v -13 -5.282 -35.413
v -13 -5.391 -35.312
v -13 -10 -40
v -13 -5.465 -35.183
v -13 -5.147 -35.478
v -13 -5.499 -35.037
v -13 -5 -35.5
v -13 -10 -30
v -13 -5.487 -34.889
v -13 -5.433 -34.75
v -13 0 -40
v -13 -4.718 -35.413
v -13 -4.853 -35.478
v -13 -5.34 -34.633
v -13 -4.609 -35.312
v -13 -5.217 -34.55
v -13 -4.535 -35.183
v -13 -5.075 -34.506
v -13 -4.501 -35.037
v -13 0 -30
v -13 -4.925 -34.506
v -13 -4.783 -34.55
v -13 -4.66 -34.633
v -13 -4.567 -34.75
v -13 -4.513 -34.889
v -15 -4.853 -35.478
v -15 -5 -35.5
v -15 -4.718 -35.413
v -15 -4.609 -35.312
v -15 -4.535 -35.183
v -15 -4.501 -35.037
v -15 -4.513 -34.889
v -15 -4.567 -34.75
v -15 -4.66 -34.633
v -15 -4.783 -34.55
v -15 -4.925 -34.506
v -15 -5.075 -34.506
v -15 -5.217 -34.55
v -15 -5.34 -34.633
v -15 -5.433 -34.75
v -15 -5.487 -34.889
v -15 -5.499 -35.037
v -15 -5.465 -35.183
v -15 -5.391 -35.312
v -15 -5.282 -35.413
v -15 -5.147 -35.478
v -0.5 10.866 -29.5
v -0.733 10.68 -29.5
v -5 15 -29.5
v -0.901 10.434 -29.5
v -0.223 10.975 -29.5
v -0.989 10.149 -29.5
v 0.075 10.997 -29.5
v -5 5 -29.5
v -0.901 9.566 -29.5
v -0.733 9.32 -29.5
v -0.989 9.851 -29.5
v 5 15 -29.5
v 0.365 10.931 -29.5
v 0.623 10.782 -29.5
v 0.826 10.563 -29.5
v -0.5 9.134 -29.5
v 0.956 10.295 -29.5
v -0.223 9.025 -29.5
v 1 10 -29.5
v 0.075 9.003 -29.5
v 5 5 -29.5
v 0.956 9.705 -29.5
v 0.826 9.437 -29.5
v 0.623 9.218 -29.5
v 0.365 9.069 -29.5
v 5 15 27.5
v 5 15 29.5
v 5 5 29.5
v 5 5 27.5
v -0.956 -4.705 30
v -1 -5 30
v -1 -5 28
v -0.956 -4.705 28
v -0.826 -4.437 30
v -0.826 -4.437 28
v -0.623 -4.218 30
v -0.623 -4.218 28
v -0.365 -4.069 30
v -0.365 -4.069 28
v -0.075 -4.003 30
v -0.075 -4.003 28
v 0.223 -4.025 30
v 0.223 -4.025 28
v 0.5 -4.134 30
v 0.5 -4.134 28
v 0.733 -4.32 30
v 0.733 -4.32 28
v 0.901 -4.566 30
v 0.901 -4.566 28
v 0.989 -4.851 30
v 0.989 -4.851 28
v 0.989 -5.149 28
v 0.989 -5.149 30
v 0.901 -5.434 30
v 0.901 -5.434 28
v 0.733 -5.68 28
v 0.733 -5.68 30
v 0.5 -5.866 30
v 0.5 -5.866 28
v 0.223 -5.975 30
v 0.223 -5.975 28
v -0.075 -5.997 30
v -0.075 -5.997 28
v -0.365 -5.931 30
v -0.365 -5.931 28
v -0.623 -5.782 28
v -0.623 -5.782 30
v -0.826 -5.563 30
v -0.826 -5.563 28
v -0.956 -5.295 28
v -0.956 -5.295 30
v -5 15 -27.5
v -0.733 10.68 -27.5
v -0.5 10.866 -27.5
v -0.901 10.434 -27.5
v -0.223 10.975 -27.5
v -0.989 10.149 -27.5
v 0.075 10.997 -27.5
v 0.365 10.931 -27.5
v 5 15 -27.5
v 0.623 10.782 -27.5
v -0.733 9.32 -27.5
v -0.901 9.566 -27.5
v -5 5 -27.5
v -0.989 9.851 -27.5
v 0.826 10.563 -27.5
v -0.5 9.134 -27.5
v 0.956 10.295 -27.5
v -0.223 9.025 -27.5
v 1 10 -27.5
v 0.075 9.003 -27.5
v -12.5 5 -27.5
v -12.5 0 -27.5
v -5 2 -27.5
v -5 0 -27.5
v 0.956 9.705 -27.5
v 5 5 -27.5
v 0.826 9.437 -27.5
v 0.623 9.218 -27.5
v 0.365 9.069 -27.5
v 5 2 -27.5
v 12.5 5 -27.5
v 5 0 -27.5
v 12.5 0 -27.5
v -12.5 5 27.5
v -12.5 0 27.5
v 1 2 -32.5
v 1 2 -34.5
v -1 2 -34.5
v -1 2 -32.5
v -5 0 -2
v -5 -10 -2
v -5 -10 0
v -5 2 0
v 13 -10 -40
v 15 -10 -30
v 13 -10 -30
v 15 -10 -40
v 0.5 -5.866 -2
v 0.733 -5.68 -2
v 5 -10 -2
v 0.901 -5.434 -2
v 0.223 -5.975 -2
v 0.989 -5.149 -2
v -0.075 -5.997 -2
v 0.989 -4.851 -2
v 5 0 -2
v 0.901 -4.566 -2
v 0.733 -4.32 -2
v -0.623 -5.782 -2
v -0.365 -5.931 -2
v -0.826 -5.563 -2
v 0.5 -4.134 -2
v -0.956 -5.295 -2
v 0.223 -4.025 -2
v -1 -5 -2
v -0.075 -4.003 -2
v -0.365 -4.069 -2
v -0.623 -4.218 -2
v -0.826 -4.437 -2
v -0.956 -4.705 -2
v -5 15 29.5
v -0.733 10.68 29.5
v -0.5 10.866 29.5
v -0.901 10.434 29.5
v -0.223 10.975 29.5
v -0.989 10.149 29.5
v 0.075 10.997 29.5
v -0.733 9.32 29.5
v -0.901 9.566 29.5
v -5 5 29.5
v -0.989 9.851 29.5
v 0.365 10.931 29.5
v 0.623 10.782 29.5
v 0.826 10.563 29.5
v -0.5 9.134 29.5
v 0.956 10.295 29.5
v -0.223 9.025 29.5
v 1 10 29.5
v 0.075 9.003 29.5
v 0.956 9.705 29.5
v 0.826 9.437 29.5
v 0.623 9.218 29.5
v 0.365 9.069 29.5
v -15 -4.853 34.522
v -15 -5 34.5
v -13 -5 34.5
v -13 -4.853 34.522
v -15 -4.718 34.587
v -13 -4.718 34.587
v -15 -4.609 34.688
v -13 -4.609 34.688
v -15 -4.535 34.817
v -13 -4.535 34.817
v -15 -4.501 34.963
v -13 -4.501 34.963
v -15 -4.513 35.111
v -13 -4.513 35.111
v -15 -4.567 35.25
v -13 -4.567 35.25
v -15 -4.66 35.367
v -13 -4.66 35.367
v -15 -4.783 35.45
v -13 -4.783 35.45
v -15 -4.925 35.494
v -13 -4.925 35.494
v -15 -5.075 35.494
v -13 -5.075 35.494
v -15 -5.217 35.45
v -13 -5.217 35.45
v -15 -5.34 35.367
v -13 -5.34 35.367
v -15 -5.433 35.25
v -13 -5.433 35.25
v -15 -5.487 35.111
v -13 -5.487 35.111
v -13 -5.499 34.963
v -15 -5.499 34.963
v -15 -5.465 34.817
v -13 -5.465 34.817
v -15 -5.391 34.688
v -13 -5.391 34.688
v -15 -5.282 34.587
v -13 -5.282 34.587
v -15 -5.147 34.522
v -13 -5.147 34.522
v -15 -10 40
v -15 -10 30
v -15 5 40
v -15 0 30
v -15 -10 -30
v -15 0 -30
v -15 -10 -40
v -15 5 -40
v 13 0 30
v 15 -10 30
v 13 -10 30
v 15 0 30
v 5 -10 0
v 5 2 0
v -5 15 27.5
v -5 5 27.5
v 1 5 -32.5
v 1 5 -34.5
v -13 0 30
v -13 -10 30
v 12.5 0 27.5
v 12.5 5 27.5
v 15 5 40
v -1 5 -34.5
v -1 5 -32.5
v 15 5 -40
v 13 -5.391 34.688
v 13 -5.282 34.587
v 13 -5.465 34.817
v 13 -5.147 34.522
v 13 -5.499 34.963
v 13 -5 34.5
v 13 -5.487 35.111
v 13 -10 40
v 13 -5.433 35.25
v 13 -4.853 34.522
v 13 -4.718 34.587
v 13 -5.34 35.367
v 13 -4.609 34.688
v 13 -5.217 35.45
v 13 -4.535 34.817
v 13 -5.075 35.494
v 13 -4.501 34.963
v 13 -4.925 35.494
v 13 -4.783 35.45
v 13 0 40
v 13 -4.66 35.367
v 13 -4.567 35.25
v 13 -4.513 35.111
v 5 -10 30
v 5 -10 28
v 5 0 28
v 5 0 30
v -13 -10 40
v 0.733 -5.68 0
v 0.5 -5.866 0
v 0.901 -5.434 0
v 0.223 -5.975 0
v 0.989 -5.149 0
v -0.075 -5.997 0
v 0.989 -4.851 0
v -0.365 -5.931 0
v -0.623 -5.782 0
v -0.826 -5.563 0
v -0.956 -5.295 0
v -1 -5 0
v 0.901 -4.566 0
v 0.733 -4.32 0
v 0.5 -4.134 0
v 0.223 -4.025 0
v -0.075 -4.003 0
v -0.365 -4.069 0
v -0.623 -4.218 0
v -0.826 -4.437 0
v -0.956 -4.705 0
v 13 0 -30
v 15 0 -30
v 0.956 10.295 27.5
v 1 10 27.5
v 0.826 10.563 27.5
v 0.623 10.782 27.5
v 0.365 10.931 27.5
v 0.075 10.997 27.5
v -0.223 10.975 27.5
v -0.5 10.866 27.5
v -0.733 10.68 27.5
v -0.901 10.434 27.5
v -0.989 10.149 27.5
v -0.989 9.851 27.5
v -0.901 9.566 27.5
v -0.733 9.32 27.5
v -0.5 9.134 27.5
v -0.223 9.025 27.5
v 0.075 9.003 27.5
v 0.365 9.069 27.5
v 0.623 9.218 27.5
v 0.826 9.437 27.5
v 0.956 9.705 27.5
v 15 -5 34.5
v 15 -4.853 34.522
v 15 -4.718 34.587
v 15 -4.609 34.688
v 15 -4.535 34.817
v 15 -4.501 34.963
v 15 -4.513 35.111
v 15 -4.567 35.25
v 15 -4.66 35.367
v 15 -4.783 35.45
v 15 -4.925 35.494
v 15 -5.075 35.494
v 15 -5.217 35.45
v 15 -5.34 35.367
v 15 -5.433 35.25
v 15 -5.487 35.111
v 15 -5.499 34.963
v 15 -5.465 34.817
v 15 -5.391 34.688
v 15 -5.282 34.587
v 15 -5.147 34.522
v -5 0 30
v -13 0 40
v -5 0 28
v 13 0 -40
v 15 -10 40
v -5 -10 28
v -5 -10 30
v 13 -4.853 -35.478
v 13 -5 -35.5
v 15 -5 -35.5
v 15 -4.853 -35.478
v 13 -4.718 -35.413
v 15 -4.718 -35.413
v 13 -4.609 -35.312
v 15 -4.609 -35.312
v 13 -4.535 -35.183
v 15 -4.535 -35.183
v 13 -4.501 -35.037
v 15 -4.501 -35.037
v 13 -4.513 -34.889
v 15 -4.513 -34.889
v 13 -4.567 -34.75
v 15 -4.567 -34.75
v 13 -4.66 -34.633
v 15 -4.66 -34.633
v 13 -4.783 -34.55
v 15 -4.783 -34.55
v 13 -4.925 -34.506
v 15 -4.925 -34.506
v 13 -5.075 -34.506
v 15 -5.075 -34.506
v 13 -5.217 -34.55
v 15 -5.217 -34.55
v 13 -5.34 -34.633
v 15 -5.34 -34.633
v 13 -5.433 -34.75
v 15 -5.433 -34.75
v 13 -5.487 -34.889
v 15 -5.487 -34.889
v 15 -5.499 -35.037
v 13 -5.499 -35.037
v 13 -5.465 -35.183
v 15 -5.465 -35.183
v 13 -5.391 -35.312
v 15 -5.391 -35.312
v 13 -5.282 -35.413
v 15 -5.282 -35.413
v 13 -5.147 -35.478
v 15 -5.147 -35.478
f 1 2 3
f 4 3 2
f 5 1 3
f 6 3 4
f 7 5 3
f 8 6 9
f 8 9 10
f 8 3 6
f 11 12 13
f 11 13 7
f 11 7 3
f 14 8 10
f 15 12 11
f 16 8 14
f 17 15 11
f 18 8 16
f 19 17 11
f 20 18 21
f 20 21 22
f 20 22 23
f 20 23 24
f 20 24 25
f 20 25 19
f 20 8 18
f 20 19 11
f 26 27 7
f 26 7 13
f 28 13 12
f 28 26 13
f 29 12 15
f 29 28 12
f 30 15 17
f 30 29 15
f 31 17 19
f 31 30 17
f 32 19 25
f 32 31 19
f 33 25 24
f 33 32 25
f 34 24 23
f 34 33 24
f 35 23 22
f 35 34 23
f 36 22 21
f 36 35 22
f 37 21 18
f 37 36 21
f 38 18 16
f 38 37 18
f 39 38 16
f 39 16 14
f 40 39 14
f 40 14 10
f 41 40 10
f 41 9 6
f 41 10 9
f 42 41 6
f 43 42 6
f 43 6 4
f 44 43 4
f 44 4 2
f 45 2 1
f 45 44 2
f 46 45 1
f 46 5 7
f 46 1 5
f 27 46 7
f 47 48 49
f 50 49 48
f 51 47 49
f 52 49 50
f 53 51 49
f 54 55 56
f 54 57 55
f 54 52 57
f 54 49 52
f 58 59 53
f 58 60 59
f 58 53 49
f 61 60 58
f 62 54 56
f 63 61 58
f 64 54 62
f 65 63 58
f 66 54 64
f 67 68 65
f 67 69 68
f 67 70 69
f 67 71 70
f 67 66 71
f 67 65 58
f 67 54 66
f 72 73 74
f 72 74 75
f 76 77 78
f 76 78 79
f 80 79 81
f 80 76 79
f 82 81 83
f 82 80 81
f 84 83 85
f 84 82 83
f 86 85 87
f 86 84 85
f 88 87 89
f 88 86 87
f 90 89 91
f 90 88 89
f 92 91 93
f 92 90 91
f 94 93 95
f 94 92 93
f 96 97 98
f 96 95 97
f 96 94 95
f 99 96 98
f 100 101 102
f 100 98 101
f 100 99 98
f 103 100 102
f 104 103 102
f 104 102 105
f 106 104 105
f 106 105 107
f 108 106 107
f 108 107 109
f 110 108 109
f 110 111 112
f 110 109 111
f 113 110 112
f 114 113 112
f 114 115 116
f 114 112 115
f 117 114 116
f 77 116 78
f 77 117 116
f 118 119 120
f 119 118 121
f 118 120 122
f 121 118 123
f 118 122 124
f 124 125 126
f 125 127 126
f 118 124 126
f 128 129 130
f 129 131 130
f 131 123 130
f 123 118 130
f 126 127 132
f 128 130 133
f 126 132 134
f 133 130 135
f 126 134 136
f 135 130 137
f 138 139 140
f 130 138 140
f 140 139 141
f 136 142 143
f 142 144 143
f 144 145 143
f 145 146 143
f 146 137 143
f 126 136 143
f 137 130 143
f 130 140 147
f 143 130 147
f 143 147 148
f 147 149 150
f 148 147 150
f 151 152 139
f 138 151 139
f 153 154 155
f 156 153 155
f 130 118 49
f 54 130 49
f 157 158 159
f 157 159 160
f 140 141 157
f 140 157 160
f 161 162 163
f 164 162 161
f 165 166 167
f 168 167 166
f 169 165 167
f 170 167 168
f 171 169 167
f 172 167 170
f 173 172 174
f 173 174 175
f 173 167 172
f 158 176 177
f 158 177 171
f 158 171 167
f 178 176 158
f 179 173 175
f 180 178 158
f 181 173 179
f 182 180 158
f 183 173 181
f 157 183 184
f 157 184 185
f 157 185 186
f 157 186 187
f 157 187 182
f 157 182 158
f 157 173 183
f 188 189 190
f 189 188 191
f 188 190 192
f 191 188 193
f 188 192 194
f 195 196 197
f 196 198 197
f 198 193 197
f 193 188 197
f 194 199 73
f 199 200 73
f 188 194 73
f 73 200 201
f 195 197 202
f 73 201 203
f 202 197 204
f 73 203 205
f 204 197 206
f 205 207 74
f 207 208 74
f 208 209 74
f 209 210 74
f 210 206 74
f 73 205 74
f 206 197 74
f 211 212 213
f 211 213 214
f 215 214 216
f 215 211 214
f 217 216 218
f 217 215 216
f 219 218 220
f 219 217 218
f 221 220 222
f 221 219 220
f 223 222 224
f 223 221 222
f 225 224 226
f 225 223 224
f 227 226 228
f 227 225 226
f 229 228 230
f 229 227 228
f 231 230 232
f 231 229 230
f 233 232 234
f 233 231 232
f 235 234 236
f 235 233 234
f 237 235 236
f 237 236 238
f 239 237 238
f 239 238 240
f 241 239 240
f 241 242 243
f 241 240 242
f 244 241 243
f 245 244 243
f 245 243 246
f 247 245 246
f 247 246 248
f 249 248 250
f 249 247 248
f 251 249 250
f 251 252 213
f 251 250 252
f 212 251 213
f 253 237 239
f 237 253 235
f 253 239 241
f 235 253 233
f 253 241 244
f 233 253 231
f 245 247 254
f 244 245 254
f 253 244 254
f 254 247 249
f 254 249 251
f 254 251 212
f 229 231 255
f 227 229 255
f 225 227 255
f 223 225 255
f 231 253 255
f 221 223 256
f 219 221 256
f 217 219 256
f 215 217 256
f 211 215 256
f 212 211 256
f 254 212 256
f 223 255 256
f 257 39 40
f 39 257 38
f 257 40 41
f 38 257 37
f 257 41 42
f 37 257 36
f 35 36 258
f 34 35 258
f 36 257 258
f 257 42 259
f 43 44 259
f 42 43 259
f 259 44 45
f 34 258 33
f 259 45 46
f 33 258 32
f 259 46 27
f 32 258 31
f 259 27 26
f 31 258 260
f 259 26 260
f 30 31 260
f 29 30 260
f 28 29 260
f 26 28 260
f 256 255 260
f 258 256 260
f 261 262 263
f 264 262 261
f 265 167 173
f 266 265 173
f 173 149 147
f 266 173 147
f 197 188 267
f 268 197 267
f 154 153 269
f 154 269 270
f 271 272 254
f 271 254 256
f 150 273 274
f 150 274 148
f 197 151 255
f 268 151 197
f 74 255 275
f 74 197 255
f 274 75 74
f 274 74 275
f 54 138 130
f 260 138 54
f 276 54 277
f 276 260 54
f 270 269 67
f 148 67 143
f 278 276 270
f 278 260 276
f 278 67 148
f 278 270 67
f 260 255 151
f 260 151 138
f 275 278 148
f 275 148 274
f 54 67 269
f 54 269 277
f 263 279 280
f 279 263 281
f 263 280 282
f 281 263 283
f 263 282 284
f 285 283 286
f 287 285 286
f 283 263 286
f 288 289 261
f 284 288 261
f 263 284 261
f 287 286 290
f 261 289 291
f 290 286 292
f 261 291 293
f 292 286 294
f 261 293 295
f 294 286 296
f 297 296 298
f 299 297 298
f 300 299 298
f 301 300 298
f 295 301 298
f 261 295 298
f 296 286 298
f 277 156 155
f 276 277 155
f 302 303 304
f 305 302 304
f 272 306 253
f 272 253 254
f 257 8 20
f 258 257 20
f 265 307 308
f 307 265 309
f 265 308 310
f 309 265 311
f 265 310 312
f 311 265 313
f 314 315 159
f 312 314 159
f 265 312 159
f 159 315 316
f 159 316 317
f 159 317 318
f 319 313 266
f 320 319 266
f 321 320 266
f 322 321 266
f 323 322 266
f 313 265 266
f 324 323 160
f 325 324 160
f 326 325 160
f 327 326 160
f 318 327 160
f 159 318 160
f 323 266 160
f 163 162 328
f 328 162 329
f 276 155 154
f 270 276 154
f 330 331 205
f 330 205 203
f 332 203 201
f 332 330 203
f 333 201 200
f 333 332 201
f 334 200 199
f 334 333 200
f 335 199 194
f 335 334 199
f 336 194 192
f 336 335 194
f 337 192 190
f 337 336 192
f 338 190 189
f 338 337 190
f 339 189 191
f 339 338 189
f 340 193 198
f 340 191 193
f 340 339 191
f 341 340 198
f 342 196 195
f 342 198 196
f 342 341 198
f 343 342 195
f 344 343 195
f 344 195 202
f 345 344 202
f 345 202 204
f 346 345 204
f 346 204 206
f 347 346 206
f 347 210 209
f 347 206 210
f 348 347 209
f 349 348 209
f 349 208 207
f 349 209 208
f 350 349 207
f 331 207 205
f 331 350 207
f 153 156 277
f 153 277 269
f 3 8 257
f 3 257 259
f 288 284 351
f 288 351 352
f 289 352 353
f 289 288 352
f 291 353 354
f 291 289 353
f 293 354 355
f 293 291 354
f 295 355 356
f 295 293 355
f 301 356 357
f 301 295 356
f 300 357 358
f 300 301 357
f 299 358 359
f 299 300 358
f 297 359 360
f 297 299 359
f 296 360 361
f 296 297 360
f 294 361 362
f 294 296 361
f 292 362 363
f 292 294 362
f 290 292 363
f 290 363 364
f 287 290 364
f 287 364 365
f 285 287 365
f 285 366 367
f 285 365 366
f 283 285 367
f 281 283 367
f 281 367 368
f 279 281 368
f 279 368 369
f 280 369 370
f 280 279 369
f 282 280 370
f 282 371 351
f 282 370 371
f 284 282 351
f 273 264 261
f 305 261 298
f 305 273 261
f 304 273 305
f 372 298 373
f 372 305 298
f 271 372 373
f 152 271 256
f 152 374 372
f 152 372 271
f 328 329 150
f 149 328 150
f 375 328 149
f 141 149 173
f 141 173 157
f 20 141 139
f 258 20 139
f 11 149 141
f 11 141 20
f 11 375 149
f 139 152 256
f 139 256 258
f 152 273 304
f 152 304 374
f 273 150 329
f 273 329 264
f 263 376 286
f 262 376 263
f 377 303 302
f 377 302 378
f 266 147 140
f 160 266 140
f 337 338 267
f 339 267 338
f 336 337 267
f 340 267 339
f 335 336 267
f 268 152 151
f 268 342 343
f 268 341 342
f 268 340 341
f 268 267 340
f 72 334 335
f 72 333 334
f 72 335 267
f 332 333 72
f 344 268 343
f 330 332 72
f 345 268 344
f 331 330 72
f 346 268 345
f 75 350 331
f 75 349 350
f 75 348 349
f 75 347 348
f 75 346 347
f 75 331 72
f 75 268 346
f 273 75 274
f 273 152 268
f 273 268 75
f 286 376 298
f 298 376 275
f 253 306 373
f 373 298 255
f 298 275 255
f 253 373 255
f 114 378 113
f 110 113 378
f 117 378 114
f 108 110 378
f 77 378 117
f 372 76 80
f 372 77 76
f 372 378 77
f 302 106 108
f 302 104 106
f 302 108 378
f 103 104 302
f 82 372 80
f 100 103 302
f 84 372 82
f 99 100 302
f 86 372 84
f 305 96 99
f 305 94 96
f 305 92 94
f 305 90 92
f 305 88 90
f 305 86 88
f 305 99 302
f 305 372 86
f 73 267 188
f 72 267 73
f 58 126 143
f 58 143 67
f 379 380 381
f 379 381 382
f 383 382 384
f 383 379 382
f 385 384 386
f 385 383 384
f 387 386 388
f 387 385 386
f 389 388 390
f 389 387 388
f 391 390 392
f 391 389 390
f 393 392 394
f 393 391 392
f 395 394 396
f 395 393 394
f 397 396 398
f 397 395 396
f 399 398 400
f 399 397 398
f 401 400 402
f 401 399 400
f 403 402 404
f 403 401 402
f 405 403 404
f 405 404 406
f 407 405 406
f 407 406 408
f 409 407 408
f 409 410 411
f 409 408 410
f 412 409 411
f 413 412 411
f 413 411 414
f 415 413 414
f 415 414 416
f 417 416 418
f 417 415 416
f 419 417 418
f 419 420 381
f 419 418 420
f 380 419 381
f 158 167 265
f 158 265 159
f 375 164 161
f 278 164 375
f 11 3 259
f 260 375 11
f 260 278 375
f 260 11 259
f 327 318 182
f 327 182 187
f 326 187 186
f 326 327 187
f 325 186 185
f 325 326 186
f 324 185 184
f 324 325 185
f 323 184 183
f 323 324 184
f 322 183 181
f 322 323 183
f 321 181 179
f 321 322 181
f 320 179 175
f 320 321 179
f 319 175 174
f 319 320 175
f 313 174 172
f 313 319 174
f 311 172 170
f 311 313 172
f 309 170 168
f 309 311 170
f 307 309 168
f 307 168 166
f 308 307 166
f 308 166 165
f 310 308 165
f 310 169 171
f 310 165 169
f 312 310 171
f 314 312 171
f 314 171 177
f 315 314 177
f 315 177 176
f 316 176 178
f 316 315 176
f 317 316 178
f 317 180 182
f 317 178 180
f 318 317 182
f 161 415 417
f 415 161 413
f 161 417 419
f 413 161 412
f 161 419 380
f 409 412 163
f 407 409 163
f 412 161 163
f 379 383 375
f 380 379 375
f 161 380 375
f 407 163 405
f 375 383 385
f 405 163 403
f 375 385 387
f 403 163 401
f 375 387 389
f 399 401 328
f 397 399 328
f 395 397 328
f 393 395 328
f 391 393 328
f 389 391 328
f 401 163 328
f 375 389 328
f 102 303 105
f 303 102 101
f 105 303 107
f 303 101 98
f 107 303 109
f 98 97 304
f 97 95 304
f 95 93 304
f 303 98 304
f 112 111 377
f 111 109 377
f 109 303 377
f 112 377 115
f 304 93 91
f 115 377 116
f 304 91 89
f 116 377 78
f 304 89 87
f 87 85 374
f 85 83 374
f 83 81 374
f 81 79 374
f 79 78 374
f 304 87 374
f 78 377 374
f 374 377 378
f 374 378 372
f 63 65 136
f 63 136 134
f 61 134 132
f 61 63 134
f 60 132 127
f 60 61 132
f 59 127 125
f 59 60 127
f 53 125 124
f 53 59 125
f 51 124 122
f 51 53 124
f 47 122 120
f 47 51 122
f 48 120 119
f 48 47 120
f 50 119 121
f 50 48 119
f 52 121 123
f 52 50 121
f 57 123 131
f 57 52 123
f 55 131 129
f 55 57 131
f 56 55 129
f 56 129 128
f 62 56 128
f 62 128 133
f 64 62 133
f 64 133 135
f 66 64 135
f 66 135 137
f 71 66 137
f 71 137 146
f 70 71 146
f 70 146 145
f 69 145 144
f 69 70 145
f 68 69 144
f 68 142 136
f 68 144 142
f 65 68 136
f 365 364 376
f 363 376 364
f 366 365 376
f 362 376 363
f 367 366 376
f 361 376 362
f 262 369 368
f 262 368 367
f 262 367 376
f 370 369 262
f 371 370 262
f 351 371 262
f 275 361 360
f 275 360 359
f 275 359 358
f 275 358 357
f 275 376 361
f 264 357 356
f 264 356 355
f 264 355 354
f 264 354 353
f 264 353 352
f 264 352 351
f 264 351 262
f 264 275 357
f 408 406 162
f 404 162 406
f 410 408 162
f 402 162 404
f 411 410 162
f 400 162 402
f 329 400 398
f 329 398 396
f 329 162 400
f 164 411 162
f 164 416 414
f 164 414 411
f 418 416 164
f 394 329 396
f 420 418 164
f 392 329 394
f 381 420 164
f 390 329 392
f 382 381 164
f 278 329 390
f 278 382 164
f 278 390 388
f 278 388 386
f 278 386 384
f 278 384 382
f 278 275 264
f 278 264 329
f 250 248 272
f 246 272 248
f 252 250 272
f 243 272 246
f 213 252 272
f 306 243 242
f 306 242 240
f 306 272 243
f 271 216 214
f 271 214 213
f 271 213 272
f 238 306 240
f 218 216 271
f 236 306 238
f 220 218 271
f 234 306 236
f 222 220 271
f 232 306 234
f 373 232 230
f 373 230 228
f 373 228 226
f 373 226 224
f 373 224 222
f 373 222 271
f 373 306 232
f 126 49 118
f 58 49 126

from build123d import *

# Parameters (mm, degrees)
SKETCH1_W                = 30
SKETCH1_H                = 80
BOSS_EXTRUDE1_DEPTH      = 5
SKETCH2_W                = 10
SKETCH2_H                = 10
BOSS_EXTRUDE2_DEPTH      = 30
CUT_EXTRUDE1_DEPTH       = 51.990195136
CUT_EXTRUDE1_DEPTH_BACK  = 51.990195136
SKETCH3_R                = 0.5
CUT_EXTRUDE2_DEPTH       = 46.276925691
CUT_EXTRUDE2_DEPTH_BACK  = 46.276925691
SKETCH4_W                = 25
SKETCH4_H                = 55
CUT_EXTRUDE3_DEPTH       = 83.006097334
CUT_EXTRUDE3_DEPTH_BACK  = 83.006097334
SKETCH5_W                = 26
SKETCH5_H                = 10
SKETCH6_W                = 10
SKETCH6_H                = 10
BOSS_EXTRUDE3_DEPTH      = 80
CUT_EXTRUDE4_DEPTH       = 83.006097334
CUT_EXTRUDE4_DEPTH_BACK  = 83.006097334
SKETCH7_R                = 1
CUT_EXTRUDE5_DEPTH       = 46.82575695
CUT_EXTRUDE5_DEPTH_BACK  = 46.82575695
SKETCH8_W                = 56
SKETCH8_H                = 10
SKETCH9_W                = 10
SKETCH9_H                = 10
CUT_EXTRUDE6_DEPTH       = 10
SKETCH10_W               = 10
SKETCH10_H               = 10
CUT_EXTRUDE7_DEPTH       = 10
SKETCH12_W               = 10
SKETCH12_H               = 2
BOSS_EXTRUDE5_DEPTH      = 10
CUT_EXTRUDE8_DEPTH       = 73.665328734
CUT_EXTRUDE8_DEPTH_BACK  = 73.665328734
SKETCH13_R               = 1
CUT_EXTRUDE11_DEPTH      = 46.276925691
CUT_EXTRUDE11_DEPTH_BACK = 46.276925691
SKETCH15_W               = 2
SKETCH15_H               = 2
SKETCH16_W               = 10
SKETCH16_H               = 10
BOSS_EXTRUDE6_DEPTH      = 30
SKETCH17_W               = 10
SKETCH17_H               = 10
CUT_EXTRUDE12_DEPTH      = 28
CUT_EXTRUDE13_DEPTH      = 48.053161424
CUT_EXTRUDE13_DEPTH_BACK = 48.053161424
SKETCH18_R               = 1
SKETCH20_W               = 10
SKETCH20_H               = 2
BOSS_EXTRUDE7_DEPTH      = 40


with BuildPart() as part:
    # Sketch1 → Boss-Extrude1 (new body)
    with BuildSketch(Plane(origin=(0, 0, 0), x_dir=(1, 0, 0), z_dir=(0, 1, 0))):
        Rectangle(SKETCH1_W, SKETCH1_H)
    extrude(amount=BOSS_EXTRUDE1_DEPTH)

    # Sketch2 → Boss-Extrude2 (add)
    with BuildSketch(Plane(origin=(15, 0, 0), x_dir=(0, 0, -1), z_dir=(1, 0, 0))):
        with Locations((-35, -5)):
            Rectangle(SKETCH2_W, SKETCH2_H)
        with Locations((35, -5)):
            Rectangle(SKETCH2_W, SKETCH2_H)
    extrude(amount=-BOSS_EXTRUDE2_DEPTH)

    # Sketch3 → Cut-Extrude1 (cut, two sides: drawn at the far end of the back side and taken through both)
    with BuildSketch(Plane(origin=(15, 0, 0), x_dir=(0, 0, -1), z_dir=(1, 0, 0)).offset(-CUT_EXTRUDE1_DEPTH_BACK)):
        with Locations((-35, -5)):
            Circle(SKETCH3_R)
        with Locations((35, -5)):
            Circle(SKETCH3_R)
    extrude(amount=CUT_EXTRUDE1_DEPTH + CUT_EXTRUDE1_DEPTH_BACK, mode=Mode.SUBTRACT)

    # Sketch4 → Cut-Extrude2 (cut, two sides: drawn at the far end of the back side and taken through both)
    with BuildSketch(Plane(origin=(0, 5, 0), x_dir=(1, 0, 0), z_dir=(0, 1, 0)).offset(-CUT_EXTRUDE2_DEPTH_BACK)):
        Rectangle(SKETCH4_W, SKETCH4_H)
    extrude(amount=CUT_EXTRUDE2_DEPTH + CUT_EXTRUDE2_DEPTH_BACK, mode=Mode.SUBTRACT)

    # Sketch5 → Cut-Extrude3 (cut, two sides: drawn at the far end of the back side and taken through both)
    with BuildSketch(Plane(origin=(0, 0, -40), x_dir=(-1, 0, 0), z_dir=(0, 0, -1)).offset(-CUT_EXTRUDE3_DEPTH_BACK)):
        with Locations((0, -5)):
            Rectangle(SKETCH5_W, SKETCH5_H)
    extrude(amount=CUT_EXTRUDE3_DEPTH + CUT_EXTRUDE3_DEPTH_BACK, mode=Mode.SUBTRACT)

    # Sketch6 → Boss-Extrude3 (add)
    with BuildSketch(Plane(origin=(0, 0, -40), x_dir=(-1, 0, 0), z_dir=(0, 0, -1))):
        with Locations((0, -5)):
            Rectangle(SKETCH6_W, SKETCH6_H)
    extrude(amount=-BOSS_EXTRUDE3_DEPTH)

    # Sketch7 → Cut-Extrude4 (cut, two sides: drawn at the far end of the back side and taken through both)
    with BuildSketch(Plane(origin=(0, 0, -40), x_dir=(-1, 0, 0), z_dir=(0, 0, -1)).offset(-CUT_EXTRUDE4_DEPTH_BACK)):
        with Locations((0, -5)):
            Circle(SKETCH7_R)
    extrude(amount=CUT_EXTRUDE4_DEPTH + CUT_EXTRUDE4_DEPTH_BACK, mode=Mode.SUBTRACT)

    # Sketch8 → Cut-Extrude5 (cut, two sides: drawn at the far end of the back side and taken through both)
    with BuildSketch(Plane(origin=(5, 0, 0), x_dir=(0, 0, -1), z_dir=(1, 0, 0)).offset(-CUT_EXTRUDE5_DEPTH_BACK)):
        with Locations((0, -5)):
            Rectangle(SKETCH8_W, SKETCH8_H)
    extrude(amount=CUT_EXTRUDE5_DEPTH + CUT_EXTRUDE5_DEPTH_BACK, mode=Mode.SUBTRACT)

    # Sketch9 → Cut-Extrude6 (cut)
    with BuildSketch(Plane.XY.offset(40)):
        with Locations((0, -5)):
            Rectangle(SKETCH9_W, SKETCH9_H)
    extrude(amount=-CUT_EXTRUDE6_DEPTH, mode=Mode.SUBTRACT)

    # Sketch10 → Cut-Extrude7 (cut)
    with BuildSketch(Plane(origin=(0, 0, -40), x_dir=(-1, 0, 0), z_dir=(0, 0, -1))):
        with Locations((0, -5)):
            Rectangle(SKETCH10_W, SKETCH10_H)
    extrude(amount=-CUT_EXTRUDE7_DEPTH, mode=Mode.SUBTRACT)

    # Sketch12 → Boss-Extrude5 (add)
    with BuildSketch(Plane(origin=(0, 5, 0), x_dir=(1, 0, 0), z_dir=(0, 1, 0))):
        with Locations((0, -28.5)):
            Rectangle(SKETCH12_W, SKETCH12_H)
        with Locations((0, 28.5)):
            Rectangle(SKETCH12_W, SKETCH12_H)
    extrude(amount=BOSS_EXTRUDE5_DEPTH)

    # Sketch13 → Cut-Extrude8 (cut, two sides: drawn at the far end of the back side and taken through both)
    with BuildSketch(Plane.XY.offset(29.5).offset(-CUT_EXTRUDE8_DEPTH_BACK)):
        with Locations((0, 10)):
            Circle(SKETCH13_R)
    extrude(amount=CUT_EXTRUDE8_DEPTH + CUT_EXTRUDE8_DEPTH_BACK, mode=Mode.SUBTRACT)

    # Sketch15 → Cut-Extrude11 (cut, two sides: drawn at the far end of the back side and taken through both)
    with BuildSketch(Plane(origin=(0, 5, 0), x_dir=(1, 0, 0), z_dir=(0, 1, 0)).offset(-CUT_EXTRUDE11_DEPTH_BACK)):
        with Locations((0, 33.5)):
            Rectangle(SKETCH15_W, SKETCH15_H)
    extrude(amount=CUT_EXTRUDE11_DEPTH + CUT_EXTRUDE11_DEPTH_BACK, mode=Mode.SUBTRACT)

    # Sketch16 → Boss-Extrude6 (add)
    with BuildSketch(Plane(origin=(0, 0, -30), x_dir=(-1, 0, 0), z_dir=(0, 0, -1))):
        with Locations((0, -5)):
            Rectangle(SKETCH16_W, SKETCH16_H)
    extrude(amount=-BOSS_EXTRUDE6_DEPTH)

    # Sketch17 → Cut-Extrude12 (cut)
    with BuildSketch(Plane(origin=(0, 0, -30), x_dir=(-1, 0, 0), z_dir=(0, 0, -1))):
        with Locations((0, -5)):
            Rectangle(SKETCH17_W, SKETCH17_H)
    extrude(amount=-CUT_EXTRUDE12_DEPTH, mode=Mode.SUBTRACT)


with BuildPart() as cut_extrude12_piece_1:
    # of the separate pieces the step leaves, piece 1, a body of its own (cut_extrude12_pieces)
    add(part.part.solids().sort_by_distance((-13, -10, -40))[0])



with BuildPart() as cut_extrude12_piece_2:
    # of the separate pieces the step leaves, piece 2, a body of its own (cut_extrude12_pieces)
    add(part.part.solids().sort_by_distance((-5, 0, -2))[0])

    # Sketch18 → Cut-Extrude13 (cut, two sides: drawn at the far end of the back side and taken through both)
    with BuildSketch(Plane(origin=(0, 0, -2), x_dir=(-1, 0, 0), z_dir=(0, 0, -1)).offset(-CUT_EXTRUDE13_DEPTH_BACK)):
        with Locations((0, -5)):
            Circle(SKETCH18_R)
    extrude(amount=CUT_EXTRUDE13_DEPTH + CUT_EXTRUDE13_DEPTH_BACK, mode=Mode.SUBTRACT)


with BuildPart() as cut_extrude12_piece_1_1:
    add(cut_extrude12_piece_1.part)

    add(cut_extrude12_piece_2.part)  # Boss-Extrude7 merges Cut-Extrude12 piece 2
    # Sketch20 → Boss-Extrude7 (add)
    with BuildSketch(Plane(origin=(0, 0, -40), x_dir=(-1, 0, 0), z_dir=(0, 0, -1))):
        with Locations((0, 1)):
            Rectangle(SKETCH20_W, SKETCH20_H)
    extrude(amount=-BOSS_EXTRUDE7_DEPTH)


solid = cut_extrude12_piece_1_1.part
